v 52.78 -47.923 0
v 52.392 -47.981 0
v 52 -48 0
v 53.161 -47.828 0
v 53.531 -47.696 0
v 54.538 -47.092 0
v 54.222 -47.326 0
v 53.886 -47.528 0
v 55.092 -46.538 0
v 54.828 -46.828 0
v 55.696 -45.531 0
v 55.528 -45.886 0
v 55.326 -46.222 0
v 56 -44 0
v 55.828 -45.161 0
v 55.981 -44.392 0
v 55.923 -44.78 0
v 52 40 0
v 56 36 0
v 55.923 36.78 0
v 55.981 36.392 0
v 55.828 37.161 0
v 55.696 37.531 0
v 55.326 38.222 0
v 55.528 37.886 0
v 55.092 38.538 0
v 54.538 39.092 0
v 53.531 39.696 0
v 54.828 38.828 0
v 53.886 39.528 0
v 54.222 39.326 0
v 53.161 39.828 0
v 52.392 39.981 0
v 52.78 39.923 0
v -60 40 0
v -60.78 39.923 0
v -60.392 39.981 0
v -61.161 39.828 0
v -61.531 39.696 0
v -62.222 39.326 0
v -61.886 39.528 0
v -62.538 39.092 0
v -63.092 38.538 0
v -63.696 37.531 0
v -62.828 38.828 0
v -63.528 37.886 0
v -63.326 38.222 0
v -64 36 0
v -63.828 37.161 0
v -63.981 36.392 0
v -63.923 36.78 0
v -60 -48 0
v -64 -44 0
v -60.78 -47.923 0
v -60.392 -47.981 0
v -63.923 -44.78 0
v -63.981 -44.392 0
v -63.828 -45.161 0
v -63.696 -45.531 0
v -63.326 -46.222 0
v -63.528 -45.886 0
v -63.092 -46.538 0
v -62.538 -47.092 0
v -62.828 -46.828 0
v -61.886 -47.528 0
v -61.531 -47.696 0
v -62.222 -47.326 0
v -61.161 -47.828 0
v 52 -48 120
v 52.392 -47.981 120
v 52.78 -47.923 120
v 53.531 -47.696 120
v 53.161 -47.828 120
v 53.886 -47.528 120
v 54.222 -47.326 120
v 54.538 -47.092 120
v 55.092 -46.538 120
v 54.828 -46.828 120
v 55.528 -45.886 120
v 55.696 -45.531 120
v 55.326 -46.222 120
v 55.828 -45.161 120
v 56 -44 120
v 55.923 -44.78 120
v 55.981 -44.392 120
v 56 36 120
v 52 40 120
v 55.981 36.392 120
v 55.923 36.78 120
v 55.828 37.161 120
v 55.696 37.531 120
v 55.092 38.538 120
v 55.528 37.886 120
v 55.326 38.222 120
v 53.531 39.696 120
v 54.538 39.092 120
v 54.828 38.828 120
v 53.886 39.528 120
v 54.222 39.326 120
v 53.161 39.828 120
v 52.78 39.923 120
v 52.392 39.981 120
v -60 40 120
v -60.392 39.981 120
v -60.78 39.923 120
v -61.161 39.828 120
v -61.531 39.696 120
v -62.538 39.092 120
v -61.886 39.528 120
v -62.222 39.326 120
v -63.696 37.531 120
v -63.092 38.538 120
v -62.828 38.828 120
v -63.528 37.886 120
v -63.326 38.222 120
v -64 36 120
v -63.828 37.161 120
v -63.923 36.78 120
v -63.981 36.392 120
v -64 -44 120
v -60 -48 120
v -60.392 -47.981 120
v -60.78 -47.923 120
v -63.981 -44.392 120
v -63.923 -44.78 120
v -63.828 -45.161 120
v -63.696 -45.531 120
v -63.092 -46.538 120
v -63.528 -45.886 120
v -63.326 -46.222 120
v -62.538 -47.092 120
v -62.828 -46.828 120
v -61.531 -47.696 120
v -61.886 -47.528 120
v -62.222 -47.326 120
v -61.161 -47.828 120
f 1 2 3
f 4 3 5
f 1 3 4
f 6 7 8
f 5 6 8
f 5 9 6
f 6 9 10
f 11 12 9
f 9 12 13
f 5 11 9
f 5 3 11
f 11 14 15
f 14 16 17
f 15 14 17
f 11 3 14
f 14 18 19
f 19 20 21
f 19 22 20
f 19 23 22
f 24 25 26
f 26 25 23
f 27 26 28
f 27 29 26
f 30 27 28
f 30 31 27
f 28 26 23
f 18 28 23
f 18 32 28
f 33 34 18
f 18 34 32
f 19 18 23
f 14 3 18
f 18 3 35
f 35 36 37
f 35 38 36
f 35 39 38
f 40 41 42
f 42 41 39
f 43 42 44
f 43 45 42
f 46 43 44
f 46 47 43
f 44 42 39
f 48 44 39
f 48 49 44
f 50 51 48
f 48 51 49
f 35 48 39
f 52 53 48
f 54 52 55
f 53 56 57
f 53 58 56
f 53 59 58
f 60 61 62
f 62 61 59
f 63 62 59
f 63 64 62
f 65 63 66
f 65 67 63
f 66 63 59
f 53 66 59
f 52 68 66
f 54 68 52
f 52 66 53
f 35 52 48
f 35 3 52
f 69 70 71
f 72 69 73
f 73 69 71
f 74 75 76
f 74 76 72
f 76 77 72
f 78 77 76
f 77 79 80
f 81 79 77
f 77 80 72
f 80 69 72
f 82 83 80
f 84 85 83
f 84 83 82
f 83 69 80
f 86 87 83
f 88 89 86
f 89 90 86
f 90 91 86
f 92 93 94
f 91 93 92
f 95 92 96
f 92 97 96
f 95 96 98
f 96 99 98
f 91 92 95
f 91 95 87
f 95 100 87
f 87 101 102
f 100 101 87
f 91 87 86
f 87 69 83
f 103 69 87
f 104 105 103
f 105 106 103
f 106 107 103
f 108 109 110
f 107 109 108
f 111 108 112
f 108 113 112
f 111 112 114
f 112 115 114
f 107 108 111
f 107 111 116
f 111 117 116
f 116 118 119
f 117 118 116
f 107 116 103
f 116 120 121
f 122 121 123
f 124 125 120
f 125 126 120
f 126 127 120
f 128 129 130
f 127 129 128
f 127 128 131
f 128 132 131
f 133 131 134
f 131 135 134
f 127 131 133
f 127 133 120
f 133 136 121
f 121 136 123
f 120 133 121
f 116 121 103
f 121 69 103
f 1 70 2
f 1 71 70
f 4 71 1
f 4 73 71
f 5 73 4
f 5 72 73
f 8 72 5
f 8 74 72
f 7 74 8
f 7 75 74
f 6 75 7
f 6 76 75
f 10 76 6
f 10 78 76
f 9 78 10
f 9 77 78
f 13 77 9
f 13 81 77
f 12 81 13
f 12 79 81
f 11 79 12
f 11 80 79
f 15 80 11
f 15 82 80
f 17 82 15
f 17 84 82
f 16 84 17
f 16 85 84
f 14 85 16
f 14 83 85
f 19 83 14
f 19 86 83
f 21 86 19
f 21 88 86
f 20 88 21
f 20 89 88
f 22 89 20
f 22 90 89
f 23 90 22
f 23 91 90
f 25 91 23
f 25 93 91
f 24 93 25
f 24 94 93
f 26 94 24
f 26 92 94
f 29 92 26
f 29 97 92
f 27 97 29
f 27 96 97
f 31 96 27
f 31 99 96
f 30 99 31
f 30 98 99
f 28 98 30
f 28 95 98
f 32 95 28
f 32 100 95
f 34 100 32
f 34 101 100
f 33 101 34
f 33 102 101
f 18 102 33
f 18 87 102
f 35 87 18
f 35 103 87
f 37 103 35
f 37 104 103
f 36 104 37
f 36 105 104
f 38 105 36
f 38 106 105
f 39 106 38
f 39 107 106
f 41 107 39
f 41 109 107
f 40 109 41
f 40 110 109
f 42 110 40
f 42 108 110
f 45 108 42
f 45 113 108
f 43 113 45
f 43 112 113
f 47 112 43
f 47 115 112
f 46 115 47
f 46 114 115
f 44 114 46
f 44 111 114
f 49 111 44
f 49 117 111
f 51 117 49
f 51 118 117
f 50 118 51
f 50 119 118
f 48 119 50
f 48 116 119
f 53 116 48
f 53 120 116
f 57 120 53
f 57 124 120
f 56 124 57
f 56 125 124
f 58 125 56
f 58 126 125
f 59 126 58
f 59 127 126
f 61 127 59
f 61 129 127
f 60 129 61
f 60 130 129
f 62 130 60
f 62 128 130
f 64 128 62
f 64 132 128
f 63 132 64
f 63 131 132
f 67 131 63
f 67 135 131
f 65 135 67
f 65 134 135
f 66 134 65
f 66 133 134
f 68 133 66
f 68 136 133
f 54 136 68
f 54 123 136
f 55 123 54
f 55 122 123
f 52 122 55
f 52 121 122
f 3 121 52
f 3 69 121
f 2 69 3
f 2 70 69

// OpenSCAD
$fn = 64;

module mains_transformer(size=[120,88,120], corner_r=4) {
    x = size[0];
    y = size[1];
    z = size[2];

    color([0.15,0.15,0.15])
    translate([-x/2, -y/2, 0])
    linear_extrude(height=z)
        offset(r=corner_r)
            square([x-2*corner_r, y-2*corner_r], center=false);
}

mains_transformer([120.0, 88.0, 120.0], corner_r=4);
